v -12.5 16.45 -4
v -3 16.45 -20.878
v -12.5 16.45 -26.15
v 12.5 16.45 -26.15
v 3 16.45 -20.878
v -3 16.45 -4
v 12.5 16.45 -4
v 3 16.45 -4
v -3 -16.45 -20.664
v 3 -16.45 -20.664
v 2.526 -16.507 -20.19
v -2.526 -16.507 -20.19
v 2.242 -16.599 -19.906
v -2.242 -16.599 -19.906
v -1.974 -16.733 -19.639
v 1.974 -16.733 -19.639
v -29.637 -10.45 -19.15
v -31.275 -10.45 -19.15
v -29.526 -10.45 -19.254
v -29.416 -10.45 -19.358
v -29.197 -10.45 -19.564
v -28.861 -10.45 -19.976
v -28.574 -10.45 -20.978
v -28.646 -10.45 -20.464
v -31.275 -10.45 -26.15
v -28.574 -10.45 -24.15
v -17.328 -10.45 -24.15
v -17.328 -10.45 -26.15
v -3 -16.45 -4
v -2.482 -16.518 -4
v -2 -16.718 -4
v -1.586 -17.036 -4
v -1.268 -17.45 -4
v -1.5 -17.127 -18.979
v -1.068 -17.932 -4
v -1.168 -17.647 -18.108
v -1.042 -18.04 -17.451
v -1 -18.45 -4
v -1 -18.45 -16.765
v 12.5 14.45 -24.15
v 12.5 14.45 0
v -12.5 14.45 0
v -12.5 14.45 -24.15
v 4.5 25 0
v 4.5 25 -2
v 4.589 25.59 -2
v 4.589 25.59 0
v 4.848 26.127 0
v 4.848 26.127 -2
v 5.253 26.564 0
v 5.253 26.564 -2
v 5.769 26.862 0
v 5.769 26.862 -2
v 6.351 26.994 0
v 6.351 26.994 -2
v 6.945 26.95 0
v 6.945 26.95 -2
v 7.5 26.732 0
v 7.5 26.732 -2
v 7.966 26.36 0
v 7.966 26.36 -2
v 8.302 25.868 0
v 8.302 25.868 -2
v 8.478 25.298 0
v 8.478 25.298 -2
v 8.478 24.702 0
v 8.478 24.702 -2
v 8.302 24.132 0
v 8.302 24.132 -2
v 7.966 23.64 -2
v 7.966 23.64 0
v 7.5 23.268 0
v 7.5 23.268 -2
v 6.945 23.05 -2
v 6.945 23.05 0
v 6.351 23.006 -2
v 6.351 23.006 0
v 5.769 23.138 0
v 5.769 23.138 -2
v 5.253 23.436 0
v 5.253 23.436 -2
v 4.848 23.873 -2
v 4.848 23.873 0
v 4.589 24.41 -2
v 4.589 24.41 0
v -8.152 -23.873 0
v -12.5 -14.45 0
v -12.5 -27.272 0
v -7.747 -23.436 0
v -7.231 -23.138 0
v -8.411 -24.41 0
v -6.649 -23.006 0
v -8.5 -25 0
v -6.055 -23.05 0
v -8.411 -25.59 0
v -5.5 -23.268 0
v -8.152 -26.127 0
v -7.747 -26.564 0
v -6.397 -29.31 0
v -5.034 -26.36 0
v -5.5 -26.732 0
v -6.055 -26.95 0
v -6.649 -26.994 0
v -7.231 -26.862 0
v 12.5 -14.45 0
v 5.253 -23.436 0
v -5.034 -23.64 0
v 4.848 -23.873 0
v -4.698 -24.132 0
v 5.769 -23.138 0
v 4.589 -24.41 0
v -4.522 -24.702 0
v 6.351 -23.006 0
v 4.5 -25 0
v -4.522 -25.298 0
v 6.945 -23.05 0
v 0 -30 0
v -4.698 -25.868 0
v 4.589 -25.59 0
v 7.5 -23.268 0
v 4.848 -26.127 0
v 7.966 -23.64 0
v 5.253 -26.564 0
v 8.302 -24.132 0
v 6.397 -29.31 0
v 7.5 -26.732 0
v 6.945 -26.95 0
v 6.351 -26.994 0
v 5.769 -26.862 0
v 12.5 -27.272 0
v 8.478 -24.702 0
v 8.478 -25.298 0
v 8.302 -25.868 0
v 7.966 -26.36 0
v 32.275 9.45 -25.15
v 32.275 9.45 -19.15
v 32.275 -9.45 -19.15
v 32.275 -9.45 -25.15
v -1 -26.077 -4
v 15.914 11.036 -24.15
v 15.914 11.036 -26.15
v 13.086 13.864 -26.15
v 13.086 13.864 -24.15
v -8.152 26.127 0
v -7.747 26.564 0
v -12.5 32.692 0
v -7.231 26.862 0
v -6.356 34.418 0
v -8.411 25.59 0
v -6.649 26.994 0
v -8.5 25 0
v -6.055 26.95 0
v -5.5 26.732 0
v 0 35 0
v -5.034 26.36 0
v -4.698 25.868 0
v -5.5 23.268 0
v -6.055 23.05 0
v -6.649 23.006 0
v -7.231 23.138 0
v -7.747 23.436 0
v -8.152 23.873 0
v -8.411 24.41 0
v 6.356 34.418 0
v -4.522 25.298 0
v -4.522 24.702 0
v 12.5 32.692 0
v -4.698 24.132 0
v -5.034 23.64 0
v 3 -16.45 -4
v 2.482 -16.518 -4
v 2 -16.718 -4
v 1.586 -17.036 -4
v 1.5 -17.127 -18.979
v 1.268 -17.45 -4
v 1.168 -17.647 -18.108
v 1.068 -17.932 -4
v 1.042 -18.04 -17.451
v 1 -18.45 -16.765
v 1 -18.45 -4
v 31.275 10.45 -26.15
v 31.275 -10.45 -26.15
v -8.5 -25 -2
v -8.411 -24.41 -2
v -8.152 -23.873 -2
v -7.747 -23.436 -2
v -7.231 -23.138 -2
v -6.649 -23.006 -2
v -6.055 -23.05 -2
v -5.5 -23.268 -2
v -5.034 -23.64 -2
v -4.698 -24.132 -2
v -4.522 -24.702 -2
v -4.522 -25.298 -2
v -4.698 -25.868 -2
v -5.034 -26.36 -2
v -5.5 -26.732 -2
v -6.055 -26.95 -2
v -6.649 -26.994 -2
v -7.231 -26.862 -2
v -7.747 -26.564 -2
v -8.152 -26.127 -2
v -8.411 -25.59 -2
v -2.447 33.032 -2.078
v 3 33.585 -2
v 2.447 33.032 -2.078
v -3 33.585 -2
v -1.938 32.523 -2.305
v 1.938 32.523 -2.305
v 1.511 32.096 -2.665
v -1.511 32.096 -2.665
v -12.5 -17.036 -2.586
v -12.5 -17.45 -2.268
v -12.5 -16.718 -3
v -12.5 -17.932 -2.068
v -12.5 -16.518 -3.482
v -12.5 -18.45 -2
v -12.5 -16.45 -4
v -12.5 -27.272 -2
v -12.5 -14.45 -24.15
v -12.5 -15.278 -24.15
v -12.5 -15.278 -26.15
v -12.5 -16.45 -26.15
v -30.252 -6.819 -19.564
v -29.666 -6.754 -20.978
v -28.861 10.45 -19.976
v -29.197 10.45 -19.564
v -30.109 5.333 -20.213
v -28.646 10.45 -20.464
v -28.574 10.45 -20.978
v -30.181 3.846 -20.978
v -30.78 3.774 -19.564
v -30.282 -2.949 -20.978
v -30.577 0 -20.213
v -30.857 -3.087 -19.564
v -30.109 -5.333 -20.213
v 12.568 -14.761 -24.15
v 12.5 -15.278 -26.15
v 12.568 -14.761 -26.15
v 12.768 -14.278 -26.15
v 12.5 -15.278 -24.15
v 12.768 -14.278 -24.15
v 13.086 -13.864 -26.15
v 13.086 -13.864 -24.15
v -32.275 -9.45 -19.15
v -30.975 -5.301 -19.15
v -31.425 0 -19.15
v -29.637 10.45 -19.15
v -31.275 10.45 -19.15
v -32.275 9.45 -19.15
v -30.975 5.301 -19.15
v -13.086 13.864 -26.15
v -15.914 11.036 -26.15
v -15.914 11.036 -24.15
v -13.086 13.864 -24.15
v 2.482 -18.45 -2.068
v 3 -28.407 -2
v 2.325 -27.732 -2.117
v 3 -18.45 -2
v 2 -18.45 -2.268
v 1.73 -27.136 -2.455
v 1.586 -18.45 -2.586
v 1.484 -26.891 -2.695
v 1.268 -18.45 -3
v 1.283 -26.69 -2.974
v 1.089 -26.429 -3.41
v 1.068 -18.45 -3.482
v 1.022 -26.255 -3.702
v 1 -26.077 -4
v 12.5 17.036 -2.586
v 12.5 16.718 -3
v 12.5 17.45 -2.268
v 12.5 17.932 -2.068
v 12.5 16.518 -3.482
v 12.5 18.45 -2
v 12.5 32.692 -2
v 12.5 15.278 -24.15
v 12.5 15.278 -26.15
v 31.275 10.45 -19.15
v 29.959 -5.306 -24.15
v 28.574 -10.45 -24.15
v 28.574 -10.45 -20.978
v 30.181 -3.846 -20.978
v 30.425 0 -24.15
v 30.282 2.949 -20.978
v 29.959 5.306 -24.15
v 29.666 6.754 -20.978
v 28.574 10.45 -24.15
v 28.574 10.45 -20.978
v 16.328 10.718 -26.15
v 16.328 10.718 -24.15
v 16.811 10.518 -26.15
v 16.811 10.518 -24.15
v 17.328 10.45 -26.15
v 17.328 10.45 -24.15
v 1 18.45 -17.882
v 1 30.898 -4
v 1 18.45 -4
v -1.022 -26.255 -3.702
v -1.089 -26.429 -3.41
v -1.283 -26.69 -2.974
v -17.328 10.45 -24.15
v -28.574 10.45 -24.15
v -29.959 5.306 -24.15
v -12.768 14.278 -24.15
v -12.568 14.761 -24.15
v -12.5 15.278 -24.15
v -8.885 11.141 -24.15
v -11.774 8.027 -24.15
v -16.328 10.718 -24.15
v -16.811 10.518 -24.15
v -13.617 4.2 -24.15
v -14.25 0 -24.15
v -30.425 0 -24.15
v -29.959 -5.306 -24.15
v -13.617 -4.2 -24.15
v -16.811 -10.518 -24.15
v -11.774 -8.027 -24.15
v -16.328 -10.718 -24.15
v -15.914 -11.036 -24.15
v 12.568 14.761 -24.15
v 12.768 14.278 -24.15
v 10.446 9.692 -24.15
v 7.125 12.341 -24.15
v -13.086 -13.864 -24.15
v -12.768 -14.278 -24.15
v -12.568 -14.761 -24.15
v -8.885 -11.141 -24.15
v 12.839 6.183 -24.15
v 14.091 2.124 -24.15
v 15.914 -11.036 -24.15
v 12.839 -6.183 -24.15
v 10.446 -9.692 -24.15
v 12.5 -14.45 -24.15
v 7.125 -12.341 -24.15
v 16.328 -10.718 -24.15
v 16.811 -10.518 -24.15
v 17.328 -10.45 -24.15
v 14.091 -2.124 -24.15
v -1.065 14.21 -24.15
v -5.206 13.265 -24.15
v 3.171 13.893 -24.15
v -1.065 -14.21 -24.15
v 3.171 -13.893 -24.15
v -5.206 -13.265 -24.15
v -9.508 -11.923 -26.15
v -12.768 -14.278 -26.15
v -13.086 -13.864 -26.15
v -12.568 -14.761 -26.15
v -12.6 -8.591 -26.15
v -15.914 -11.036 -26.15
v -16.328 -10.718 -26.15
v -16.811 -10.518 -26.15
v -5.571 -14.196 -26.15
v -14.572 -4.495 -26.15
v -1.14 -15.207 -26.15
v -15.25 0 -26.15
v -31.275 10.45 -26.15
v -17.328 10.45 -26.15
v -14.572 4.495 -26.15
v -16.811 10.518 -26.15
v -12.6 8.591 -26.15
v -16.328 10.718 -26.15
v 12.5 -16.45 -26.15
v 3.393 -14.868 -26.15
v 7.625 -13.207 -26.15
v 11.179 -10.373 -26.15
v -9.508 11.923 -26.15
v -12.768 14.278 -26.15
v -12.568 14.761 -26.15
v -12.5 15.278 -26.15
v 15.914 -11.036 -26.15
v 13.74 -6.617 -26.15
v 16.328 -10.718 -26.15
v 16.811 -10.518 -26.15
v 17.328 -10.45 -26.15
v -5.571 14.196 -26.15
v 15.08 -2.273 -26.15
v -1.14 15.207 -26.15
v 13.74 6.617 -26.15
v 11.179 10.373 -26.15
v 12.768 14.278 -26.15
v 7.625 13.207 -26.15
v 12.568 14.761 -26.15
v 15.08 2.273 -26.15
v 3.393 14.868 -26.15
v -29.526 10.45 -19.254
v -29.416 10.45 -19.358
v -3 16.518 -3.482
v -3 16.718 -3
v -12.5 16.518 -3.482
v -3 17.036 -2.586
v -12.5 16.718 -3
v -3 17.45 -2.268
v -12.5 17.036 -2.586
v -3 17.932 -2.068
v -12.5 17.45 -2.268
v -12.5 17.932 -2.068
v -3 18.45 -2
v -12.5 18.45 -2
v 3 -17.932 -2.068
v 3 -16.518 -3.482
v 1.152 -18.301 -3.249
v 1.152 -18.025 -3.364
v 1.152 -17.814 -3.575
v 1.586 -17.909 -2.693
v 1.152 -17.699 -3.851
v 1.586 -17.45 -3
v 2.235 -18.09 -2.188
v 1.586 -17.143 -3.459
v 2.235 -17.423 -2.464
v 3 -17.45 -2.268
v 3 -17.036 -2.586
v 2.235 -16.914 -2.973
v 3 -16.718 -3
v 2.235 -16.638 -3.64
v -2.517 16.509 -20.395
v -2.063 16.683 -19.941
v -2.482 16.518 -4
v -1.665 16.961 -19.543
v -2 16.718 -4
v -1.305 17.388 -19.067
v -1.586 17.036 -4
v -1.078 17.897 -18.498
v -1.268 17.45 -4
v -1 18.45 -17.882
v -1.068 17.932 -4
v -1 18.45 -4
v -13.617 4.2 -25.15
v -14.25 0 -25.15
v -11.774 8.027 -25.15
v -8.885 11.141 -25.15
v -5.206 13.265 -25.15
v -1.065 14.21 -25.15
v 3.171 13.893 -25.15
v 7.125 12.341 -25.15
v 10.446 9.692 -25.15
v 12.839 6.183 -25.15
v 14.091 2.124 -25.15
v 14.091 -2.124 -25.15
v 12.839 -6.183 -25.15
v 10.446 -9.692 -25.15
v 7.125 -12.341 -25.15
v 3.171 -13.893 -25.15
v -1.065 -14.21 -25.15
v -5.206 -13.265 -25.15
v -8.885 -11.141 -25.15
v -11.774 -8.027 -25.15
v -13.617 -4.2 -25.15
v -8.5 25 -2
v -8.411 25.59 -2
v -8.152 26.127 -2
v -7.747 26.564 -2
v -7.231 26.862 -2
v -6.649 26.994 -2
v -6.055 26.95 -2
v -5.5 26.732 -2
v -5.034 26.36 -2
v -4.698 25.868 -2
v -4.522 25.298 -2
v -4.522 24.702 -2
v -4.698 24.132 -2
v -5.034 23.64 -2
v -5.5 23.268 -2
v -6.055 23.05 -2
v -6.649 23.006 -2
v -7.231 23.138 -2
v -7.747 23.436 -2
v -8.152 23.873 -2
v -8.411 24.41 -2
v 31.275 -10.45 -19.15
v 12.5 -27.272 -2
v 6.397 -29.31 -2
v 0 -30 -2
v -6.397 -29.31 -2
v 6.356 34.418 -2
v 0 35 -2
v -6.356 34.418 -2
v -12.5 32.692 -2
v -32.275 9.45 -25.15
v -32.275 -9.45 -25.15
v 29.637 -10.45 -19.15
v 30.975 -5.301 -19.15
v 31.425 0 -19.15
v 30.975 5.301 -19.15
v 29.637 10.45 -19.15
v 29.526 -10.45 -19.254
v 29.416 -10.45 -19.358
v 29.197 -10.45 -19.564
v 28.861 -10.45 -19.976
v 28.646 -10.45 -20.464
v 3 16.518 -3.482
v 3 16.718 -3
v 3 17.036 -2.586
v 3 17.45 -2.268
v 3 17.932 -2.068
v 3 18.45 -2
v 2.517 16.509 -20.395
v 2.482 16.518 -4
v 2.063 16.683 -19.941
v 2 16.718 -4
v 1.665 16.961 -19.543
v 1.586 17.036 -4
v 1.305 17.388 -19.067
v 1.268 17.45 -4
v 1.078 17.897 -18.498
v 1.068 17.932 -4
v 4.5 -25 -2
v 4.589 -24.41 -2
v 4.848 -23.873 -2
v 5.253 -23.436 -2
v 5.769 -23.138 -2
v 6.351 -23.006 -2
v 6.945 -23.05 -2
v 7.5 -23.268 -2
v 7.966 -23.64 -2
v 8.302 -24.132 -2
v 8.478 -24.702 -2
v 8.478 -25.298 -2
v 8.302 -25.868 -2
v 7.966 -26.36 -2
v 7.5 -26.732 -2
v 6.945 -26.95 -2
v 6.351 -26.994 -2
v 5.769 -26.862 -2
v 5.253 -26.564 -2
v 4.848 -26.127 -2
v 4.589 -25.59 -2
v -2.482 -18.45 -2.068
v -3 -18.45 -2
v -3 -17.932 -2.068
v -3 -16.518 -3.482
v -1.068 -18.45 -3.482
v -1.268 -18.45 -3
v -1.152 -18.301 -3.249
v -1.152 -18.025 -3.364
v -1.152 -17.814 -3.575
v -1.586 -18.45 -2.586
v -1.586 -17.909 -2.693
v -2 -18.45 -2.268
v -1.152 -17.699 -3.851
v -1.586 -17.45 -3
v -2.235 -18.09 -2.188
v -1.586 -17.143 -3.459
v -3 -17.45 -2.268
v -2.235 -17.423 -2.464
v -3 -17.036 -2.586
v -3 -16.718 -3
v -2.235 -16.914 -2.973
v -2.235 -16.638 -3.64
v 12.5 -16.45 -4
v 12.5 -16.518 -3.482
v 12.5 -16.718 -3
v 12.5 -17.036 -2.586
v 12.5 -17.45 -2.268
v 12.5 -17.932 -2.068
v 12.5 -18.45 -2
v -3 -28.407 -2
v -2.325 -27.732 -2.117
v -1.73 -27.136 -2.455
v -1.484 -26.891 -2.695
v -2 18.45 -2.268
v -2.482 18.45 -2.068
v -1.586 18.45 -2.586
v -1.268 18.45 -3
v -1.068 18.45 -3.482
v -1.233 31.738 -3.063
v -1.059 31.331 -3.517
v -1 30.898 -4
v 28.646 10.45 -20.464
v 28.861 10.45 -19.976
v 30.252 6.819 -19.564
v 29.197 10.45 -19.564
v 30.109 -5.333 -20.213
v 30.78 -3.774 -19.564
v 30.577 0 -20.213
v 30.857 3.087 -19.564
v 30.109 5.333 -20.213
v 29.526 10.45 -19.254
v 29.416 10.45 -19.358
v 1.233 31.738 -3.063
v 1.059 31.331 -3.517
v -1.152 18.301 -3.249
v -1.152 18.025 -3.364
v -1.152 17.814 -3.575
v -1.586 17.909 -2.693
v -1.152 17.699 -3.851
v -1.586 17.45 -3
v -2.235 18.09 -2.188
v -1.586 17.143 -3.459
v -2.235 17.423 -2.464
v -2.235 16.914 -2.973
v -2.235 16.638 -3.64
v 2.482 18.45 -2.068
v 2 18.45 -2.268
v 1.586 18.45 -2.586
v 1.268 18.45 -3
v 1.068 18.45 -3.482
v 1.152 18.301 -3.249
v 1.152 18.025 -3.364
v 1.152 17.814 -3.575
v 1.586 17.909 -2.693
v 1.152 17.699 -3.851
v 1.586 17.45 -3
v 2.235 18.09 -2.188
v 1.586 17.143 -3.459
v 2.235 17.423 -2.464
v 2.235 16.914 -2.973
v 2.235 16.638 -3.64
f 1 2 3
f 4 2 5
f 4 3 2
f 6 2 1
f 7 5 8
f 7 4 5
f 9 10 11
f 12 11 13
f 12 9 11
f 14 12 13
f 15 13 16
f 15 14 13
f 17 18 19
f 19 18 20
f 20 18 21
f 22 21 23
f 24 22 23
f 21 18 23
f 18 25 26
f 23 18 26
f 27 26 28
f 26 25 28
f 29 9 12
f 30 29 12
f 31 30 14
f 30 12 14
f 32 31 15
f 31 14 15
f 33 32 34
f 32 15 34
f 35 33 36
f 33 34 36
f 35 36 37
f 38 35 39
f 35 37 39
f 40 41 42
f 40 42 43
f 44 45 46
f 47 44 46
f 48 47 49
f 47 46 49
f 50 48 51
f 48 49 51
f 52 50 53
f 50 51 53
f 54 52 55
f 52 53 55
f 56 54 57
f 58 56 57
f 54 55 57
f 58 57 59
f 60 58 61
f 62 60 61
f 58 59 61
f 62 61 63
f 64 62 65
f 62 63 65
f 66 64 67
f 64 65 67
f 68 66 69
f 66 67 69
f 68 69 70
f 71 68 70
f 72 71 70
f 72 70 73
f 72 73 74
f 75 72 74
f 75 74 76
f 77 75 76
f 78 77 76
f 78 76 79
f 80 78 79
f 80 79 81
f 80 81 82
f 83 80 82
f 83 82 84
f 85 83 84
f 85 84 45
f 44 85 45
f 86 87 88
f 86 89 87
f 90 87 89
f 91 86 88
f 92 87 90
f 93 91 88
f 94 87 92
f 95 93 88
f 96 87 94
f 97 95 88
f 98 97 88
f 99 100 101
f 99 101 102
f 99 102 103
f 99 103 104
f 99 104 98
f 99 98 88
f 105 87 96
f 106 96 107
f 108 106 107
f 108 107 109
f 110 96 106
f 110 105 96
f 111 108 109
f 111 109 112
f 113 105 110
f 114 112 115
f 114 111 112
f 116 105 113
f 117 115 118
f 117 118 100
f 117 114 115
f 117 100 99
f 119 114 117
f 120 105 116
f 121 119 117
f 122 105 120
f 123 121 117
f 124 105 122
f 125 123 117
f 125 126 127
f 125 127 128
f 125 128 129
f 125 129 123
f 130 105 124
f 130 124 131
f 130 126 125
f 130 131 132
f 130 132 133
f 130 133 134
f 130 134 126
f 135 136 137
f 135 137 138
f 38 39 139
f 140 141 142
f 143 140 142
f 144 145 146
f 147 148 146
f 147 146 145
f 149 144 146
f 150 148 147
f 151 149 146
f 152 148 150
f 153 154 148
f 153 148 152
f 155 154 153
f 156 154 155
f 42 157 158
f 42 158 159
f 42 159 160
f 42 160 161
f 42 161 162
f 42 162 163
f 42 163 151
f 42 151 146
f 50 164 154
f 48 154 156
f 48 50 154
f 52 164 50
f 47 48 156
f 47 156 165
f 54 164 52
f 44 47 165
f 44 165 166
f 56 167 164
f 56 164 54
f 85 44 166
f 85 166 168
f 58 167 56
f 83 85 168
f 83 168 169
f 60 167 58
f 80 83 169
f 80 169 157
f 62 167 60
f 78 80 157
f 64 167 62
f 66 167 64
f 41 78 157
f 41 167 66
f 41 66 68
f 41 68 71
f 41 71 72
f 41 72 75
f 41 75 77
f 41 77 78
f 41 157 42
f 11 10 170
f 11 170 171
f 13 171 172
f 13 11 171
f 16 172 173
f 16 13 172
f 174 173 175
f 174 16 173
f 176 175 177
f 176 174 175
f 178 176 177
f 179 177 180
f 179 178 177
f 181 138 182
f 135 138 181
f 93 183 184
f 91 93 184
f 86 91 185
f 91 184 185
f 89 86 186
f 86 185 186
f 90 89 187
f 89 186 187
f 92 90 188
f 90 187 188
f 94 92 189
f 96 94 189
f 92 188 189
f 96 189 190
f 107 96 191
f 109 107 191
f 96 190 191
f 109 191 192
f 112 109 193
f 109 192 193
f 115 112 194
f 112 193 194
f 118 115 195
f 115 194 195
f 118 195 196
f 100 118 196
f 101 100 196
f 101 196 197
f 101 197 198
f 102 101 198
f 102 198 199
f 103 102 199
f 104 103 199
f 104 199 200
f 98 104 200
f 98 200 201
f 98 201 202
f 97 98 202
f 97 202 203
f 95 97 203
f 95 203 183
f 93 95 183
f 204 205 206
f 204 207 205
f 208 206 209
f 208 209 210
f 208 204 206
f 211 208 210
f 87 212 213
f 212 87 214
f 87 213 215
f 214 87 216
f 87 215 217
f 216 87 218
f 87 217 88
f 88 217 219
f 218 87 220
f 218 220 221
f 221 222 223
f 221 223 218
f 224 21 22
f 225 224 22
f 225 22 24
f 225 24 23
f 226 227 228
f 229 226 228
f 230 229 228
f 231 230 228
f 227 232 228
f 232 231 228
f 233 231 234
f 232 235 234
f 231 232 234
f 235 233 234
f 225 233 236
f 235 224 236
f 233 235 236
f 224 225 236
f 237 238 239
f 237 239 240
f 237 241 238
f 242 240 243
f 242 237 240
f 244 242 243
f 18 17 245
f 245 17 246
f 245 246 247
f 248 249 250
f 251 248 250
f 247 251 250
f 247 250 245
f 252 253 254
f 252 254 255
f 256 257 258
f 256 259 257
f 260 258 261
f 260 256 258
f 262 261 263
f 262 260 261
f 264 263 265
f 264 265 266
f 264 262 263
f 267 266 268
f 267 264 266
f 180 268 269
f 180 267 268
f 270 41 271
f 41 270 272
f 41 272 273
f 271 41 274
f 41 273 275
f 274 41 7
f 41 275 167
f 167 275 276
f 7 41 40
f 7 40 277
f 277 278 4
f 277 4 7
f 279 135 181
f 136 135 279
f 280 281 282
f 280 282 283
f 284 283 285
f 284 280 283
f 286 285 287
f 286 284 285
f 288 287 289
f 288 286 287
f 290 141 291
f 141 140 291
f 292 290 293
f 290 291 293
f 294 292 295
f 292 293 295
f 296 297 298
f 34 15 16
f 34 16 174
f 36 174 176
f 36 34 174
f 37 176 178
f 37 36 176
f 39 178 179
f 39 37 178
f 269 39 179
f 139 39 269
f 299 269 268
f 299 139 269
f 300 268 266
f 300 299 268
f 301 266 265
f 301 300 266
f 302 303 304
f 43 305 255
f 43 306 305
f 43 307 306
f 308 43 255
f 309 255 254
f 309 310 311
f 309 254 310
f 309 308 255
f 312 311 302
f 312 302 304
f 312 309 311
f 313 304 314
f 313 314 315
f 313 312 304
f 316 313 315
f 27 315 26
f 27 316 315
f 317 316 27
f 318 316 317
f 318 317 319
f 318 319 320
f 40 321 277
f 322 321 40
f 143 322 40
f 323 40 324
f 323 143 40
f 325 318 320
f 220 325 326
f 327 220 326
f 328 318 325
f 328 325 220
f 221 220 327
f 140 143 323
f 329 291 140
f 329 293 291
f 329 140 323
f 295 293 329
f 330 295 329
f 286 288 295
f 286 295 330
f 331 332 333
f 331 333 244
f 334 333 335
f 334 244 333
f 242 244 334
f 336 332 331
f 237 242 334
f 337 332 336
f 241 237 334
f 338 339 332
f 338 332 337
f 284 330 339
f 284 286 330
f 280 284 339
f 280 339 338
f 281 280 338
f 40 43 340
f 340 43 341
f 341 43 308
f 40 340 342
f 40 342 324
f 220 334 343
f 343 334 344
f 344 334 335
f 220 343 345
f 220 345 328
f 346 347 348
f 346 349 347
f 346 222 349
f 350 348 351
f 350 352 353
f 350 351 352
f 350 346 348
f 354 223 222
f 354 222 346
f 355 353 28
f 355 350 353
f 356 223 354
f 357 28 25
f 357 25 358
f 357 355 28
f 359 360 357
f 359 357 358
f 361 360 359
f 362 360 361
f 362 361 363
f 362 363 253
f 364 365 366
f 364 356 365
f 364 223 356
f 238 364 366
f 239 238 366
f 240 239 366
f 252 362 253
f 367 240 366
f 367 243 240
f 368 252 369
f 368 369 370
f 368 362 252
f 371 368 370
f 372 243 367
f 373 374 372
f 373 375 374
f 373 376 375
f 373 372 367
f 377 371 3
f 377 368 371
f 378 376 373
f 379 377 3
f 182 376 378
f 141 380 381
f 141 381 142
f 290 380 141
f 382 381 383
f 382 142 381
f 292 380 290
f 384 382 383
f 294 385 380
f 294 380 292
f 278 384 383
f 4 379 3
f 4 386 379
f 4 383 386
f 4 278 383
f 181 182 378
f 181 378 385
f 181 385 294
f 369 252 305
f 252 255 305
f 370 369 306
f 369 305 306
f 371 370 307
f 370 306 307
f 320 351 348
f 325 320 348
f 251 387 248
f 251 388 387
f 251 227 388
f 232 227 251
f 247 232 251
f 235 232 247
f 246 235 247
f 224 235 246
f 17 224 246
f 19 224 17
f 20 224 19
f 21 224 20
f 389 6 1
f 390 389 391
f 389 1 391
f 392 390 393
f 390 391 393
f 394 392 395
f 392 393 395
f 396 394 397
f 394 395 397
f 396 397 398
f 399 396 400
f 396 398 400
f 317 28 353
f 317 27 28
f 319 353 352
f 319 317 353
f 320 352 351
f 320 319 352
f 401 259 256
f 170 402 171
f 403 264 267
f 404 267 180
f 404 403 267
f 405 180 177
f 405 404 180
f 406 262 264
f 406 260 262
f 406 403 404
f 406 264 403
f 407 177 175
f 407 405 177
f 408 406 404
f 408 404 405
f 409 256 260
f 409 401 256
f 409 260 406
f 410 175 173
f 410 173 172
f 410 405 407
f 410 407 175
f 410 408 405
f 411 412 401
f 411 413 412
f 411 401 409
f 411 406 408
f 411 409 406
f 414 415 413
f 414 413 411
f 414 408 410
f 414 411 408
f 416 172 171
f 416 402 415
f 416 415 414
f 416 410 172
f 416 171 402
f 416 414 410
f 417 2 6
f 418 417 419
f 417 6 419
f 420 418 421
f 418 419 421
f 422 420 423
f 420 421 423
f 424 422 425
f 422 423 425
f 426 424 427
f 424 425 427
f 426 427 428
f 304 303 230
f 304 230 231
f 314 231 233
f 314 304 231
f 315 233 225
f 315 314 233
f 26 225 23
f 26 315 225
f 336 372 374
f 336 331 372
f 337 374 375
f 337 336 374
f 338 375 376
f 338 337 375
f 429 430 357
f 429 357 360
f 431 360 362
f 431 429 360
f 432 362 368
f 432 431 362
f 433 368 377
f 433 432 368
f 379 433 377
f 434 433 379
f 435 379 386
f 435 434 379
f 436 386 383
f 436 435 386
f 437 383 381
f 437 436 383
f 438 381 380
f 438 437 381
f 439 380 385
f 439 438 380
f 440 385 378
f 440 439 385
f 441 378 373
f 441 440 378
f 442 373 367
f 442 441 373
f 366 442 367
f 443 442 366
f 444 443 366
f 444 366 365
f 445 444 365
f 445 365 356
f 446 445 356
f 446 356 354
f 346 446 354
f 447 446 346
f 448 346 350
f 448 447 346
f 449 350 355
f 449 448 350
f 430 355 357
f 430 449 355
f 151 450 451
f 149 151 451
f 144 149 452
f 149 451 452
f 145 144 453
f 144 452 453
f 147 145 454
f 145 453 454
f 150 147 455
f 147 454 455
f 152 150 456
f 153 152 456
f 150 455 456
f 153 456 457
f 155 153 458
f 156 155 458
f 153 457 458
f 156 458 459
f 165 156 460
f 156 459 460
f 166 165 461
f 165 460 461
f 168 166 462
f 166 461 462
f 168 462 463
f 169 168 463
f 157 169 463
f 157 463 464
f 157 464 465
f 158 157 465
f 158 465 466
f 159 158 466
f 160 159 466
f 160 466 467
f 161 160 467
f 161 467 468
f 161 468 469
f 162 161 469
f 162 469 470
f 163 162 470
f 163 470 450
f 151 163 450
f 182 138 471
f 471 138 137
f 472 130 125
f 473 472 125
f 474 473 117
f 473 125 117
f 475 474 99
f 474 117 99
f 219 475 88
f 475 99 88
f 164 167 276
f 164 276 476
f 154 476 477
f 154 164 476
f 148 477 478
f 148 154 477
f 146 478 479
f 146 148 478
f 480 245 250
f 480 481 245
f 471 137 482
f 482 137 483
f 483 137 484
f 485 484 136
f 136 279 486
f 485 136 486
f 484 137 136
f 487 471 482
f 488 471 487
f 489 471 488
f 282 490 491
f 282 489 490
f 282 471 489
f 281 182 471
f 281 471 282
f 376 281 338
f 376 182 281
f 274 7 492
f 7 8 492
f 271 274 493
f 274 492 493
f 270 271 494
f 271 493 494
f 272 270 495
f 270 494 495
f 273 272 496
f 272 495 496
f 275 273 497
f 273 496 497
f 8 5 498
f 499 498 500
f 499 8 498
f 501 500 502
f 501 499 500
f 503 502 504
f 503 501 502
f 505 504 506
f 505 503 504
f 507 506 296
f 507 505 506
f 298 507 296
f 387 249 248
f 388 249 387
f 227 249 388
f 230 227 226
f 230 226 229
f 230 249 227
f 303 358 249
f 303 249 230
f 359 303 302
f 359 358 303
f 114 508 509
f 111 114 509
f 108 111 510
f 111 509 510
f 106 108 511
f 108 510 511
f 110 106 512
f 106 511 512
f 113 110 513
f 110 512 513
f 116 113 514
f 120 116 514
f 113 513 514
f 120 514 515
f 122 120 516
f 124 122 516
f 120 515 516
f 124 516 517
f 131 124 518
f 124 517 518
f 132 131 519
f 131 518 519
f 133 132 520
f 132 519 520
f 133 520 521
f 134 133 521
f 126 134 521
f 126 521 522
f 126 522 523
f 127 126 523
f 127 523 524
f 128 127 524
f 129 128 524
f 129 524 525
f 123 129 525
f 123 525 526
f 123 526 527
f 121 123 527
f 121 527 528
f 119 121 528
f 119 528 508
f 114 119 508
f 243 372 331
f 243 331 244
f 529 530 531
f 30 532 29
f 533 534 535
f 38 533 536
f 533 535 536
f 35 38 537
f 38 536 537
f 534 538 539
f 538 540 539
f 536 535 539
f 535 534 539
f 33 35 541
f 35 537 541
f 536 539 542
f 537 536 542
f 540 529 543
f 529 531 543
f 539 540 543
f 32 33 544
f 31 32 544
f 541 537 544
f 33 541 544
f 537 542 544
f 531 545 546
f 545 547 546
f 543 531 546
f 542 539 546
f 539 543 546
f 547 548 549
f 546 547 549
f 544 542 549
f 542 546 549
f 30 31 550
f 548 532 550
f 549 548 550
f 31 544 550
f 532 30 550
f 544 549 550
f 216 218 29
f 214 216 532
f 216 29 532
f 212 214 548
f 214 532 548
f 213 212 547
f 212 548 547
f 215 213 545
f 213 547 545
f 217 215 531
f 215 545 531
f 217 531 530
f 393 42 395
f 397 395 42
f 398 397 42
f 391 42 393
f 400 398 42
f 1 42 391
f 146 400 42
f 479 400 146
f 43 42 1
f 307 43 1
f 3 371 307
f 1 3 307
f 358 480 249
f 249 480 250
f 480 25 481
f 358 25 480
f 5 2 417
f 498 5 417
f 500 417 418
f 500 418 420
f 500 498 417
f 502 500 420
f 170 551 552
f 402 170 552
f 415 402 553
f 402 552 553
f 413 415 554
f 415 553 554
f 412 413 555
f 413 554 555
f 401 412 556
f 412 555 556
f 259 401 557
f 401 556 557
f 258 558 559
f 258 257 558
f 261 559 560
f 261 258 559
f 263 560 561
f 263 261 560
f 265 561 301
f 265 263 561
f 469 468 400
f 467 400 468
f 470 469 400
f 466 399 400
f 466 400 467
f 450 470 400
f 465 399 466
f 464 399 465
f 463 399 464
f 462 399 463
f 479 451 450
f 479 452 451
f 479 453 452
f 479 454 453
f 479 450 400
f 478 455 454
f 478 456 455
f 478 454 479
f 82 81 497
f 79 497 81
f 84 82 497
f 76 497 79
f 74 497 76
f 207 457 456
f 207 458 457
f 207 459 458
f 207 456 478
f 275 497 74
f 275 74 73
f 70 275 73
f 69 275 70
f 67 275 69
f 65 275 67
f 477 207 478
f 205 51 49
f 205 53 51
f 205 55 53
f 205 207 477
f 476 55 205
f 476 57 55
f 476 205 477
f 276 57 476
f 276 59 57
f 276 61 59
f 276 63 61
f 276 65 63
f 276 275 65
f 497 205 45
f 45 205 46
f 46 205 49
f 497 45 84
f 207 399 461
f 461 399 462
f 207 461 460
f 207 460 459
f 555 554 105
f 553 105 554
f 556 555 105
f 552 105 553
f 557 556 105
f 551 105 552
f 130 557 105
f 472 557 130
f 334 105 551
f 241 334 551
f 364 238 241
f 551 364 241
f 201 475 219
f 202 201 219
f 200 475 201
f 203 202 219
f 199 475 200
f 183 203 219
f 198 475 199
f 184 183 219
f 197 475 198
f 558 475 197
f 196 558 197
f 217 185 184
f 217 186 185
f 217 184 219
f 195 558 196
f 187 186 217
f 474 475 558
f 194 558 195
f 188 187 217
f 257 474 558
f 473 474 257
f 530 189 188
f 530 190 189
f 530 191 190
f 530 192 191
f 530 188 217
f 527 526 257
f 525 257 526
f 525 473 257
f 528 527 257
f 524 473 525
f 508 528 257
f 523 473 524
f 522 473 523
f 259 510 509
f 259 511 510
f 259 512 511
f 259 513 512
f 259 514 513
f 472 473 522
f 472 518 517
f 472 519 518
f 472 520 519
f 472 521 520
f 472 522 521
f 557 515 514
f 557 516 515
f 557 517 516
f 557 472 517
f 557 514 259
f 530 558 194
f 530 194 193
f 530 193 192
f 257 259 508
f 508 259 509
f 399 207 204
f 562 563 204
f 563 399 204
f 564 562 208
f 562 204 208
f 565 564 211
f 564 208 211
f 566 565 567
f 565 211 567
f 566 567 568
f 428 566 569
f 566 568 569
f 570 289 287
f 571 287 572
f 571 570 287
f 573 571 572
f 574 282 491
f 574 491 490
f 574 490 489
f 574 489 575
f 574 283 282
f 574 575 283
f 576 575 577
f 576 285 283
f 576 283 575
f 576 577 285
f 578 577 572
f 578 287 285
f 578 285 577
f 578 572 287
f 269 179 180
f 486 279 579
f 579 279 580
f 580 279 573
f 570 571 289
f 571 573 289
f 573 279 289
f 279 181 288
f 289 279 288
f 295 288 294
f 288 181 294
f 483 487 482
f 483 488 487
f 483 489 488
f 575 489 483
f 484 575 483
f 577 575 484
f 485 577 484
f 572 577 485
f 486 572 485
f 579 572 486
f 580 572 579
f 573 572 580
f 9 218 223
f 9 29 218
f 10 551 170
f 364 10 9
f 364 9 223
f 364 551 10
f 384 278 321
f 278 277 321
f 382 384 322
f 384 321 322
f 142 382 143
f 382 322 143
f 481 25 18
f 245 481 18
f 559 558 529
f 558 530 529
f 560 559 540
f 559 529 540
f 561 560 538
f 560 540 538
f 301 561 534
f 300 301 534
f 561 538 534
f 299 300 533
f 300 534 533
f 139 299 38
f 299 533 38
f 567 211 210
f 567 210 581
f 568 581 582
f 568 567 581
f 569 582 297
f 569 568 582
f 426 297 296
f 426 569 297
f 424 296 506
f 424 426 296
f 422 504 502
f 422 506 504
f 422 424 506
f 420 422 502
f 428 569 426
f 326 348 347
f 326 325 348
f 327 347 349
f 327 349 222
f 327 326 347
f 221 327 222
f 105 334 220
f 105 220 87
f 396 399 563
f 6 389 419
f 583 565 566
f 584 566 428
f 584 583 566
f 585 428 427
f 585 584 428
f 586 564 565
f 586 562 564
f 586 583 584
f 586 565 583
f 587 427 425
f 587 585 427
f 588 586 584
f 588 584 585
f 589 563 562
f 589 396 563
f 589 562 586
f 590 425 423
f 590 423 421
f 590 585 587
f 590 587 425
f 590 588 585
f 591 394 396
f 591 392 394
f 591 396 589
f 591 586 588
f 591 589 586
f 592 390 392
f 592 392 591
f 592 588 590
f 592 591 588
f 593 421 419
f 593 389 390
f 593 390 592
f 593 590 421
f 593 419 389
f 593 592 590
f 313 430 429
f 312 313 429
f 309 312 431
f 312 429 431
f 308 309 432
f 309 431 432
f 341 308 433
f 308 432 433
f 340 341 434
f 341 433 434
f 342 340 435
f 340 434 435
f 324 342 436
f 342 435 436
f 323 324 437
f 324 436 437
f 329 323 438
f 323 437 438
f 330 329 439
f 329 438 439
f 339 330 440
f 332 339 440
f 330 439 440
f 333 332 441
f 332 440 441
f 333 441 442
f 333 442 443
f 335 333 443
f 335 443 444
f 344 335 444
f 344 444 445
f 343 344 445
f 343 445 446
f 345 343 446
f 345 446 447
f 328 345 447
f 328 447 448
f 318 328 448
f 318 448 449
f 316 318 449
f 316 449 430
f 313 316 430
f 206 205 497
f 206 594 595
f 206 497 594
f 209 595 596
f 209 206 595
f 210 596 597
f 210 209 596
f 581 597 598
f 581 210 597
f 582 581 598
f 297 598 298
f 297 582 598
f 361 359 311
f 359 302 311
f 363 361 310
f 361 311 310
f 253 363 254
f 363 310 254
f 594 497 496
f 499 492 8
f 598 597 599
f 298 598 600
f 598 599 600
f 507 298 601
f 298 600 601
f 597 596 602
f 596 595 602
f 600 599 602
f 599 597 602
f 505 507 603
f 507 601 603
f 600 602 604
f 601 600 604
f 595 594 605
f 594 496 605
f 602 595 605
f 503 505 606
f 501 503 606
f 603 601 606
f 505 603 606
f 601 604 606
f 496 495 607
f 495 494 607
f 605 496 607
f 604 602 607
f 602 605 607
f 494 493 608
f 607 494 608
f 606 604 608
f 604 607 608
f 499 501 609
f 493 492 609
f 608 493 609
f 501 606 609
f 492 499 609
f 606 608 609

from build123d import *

# Parameters (mm, degrees)
BOSS_EXTRUDE1_DEPTH     = 12.5
SKETCH2_R               = 45
SKETCH2_R_2             = 35
CUT_EXTRUDE_THIN1_DEPTH = 10
CUT_EXTRUDE1_DEPTH      = 10
BOSS_EXTRUDE2_DEPTH     = 32.275
SKETCH5_R               = 14.25
CUT_EXTRUDE2_DEPTH      = 40
CHAMFER1_SIZE           = 5
CHAMFER2_SIZE           = 1
BOSS_EXTRUDE3_DEPTH     = 5
CHAMFER3_SIZE           = 5
FILLET1_R               = 3
RIB2_REACH              = 56.318
SKETCH7_WALL_W          = 134.965083932
SKETCH7_WALL_H          = 2
RIB3_REACH              = 56.318
SKETCH8_WALL_W          = 131.736112932
SKETCH8_WALL_H          = 2
CUT_EXTRUDE3_DEPTH      = 55.318487934
CHAMFER4_SIZE           = 1
SKETCH10_R              = 2
CUT_EXTRUDE4_DEPTH      = 5
CHAMFER5_SIZE           = 1
FILLET2_R               = 2


with BuildPart() as part:
    # Sketch1 → Boss-Extrude1 (new, symmetric)
    with BuildSketch(Plane(origin=(0, 0, 0), x_dir=(0, 0, -1), z_dir=(1, 0, 0))):
        Polygon((0, 35), (0, 14.45), (24.15, 14.45), (24.15, -14.45), (0, -14.45), (0, -35), (2, -35), (2, -16.45), (26.15, -16.45), (26.15, 16.45), (2, 16.45), (2, 35), align=None)
    extrude(amount=BOSS_EXTRUDE1_DEPTH, both=True)

    # Sketch2 → Cut-Extrude-Thin1 (cut)
    with BuildSketch(Plane.XY):
        Circle(SKETCH2_R)
        Circle(SKETCH2_R_2, mode=Mode.SUBTRACT)
    extrude(amount=-CUT_EXTRUDE_THIN1_DEPTH, mode=Mode.SUBTRACT)

    # Sketch3 → Cut-Extrude1 (cut)
    with BuildSketch(Plane.XY):
        with BuildLine():
            Line((12.5, -32.691742077), (12.5, -27.271780287))
            ThreePointArc((12.5, -27.271780287), (0, -30), (-12.5, -27.271780287))
            Line((-12.5, -27.271780287), (-12.5, -32.691742077))
            ThreePointArc((-12.5, -32.691742077), (0, -35), (12.5, -32.691742077))
        make_face()
    extrude(amount=-CUT_EXTRUDE1_DEPTH, mode=Mode.SUBTRACT)

    # Sketch4 → Boss-Extrude2 (add, symmetric)
    with BuildSketch(Plane(origin=(0, 0, 0), x_dir=(0, 0, -1), z_dir=(1, 0, 0))):
        Polygon((14.075, 16.45), (14.075, 14.45), (24.15, 14.45), (24.15, -14.45), (14.075, -14.45), (14.075, -16.45), (26.15, -16.45), (26.15, 16.45), align=None)
    extrude(amount=BOSS_EXTRUDE2_DEPTH, both=True)

    # Sketch5 → Cut-Extrude2 (cut)
    with BuildSketch(Plane(origin=(0, 0, -26.15), x_dir=(-1, 0, 0), z_dir=(0, 0, -1))):
        Circle(SKETCH5_R)
    extrude(amount=-CUT_EXTRUDE2_DEPTH, mode=Mode.SUBTRACT)

    # Chamfer1
    chamfer1_edges = [part.edges().sort_by_distance(p)[0] for p in [
        (12.5, -15.45, -14.075),
        (-12.5, -15.45, -14.075),
        (12.5, 15.45, -14.075),
        (-12.5, 15.45, -14.075),
    ]]
    chamfer(chamfer1_edges, length=CHAMFER1_SIZE)

    # Chamfer2
    chamfer2_edges = [part.edges().sort_by_distance(p)[0] for p in [
        (14.25, 0, -26.15),
    ]]
    chamfer(chamfer2_edges, length=CHAMFER2_SIZE)

    # Sketch6 → Boss-Extrude3 (add)
    with BuildSketch(Plane.XY.offset(-24.15)):
        with BuildLine():
            Line((-32.275, -14.45), (-32.275, 14.45))
            Line((-32.275, 14.45), (-26.774579829, 14.45))
            ThreePointArc((-26.774579829, 14.45), (-30.425, 0), (-26.774579829, -14.45))
            Line((-26.774579829, -14.45), (-32.275, -14.45))
        make_face()
        with BuildLine():
            Line((32.275, -14.45), (26.774579829, -14.45))
            ThreePointArc((26.774579829, -14.45), (30.425, 0), (26.774579829, 14.45))
            Line((26.774579829, 14.45), (32.275, 14.45))
            Line((32.275, 14.45), (32.275, -14.45))
        make_face()
    extrude(amount=BOSS_EXTRUDE3_DEPTH)

    # Chamfer3
    chamfer3_edges = [part.edges().sort_by_distance(p)[0] for p in [
        (-32.275, 16.45, -20.1125),
        (-32.275, -16.45, -20.1125),
        (32.275, -16.45, -20.1125),
        (32.275, 16.45, -20.1125),
    ]]
    chamfer(chamfer3_edges, length=CHAMFER3_SIZE)

    # Fillet1
    fillet1_edges = [part.edges().sort_by_distance(p)[0] for p in [
        (-28.024789914, -14.45, -19.15),
        (28.024789914, -14.45, -19.15),
        (28.024789914, 14.45, -19.15),
        (-28.024789914, 14.45, -19.15),
    ]]
    fillet(fillet1_edges, radius=FILLET1_R)

    # Sketch7 wall → Rib2 (add, up to next)
    with BuildSketch(Plane(origin=(0, 24.570871039, -11.05625), x_dir=(0, -0.667612213603, -0.744509188827), z_dir=(0, 0.744509188827, -0.667612213603)), mode=Mode.PRIVATE) as rib2_sk1:
        Rectangle(SKETCH7_WALL_W, SKETCH7_WALL_H)
    rib2_tool1 = extrude(rib2_sk1.sketch, amount=-RIB2_REACH, mode=Mode.PRIVATE) - part.part
    add(rib2_tool1.solids().sort_by_distance((0, 24.570871039, -11.05625))[0])

    # Sketch8 wall → Rib3 (add, up to next)
    with BuildSketch(Plane(origin=(0, -21.860890144, -11.05625), x_dir=(0, -0.512901558692, 0.858447430593), z_dir=(0, -0.858447430593, -0.512901558692)), mode=Mode.PRIVATE) as rib3_sk1:
        Rectangle(SKETCH8_WALL_W, SKETCH8_WALL_H)
    rib3_tool1 = extrude(rib3_sk1.sketch, amount=-RIB3_REACH, mode=Mode.PRIVATE) - part.part
    add(rib3_tool1.solids().sort_by_distance((0, -21.860890144, -11.05625))[0])

    # Sketch9 → Cut-Extrude3 (cut, through all)
    with BuildSketch(Plane(origin=(0, 0, -26.15), x_dir=(-1, 0, 0), z_dir=(0, 0, -1))):
        Polygon((12.5, 14.45), (12.5, 16.45), (27.275, 16.45), (32.275, 11.45), (32.275, 10.45), (16.5, 10.45), align=None)
        Polygon((-27.275, 16.45), (-32.275, 11.45), (-32.275, 10.45), (-16.5, 10.45), (-12.5, 14.45), (-12.5, 16.45), align=None)
        Polygon((27.275, -16.45), (32.275, -11.45), (32.275, -10.45), (16.5, -10.45), (12.5, -14.45), (12.5, -16.45), align=None)
        Polygon((-12.5, -14.45), (-12.5, -16.45), (-27.275, -16.45), (-32.275, -11.45), (-32.275, -10.45), (-16.5, -10.45), align=None)
    extrude(amount=-CUT_EXTRUDE3_DEPTH, mode=Mode.SUBTRACT)

    # Chamfer4
    chamfer4_edges = [part.edges().sort_by_distance(p)[0] for p in [
        (30.425, 0, -19.15),
        (-30.425, 0, -19.15),
    ]]
    chamfer(chamfer4_edges, length=CHAMFER4_SIZE)

    # Sketch10 → Cut-Extrude4 (cut)
    with BuildSketch(Plane(origin=(0, 0, -2), x_dir=(-1, 0, 0), z_dir=(0, 0, -1))):
        with Locations((6.5, 25)):
            Circle(SKETCH10_R)
        with Locations((-6.5, 25)):
            Circle(SKETCH10_R)
        with Locations((-6.5, -25)):
            Circle(SKETCH10_R)
        with Locations((6.5, -25)):
            Circle(SKETCH10_R)
    extrude(amount=-CUT_EXTRUDE4_DEPTH, mode=Mode.SUBTRACT)

    # Chamfer5
    chamfer5_edges = [part.edges().sort_by_distance(p)[0] for p in [
        (-32.275, 10.45, -22.65),
        (32.275, 10.45, -22.65),
        (-32.275, 0, -26.15),
        (-32.275, -10.45, -22.65),
        (32.275, 0, -26.15),
        (32.275, -10.45, -22.65),
    ]]
    chamfer(chamfer5_edges, length=CHAMFER5_SIZE)

    # Fillet2
    fillet2_edges = [part.edges().sort_by_distance(p)[0] for p in [
        (-30.425, 0, -20.15),
        (30.425, 0, -20.15),
        (12.5, 14.45, -25.15),
        (-12.5, 14.45, -25.15),
        (-12.5, -14.45, -25.15),
        (12.5, -14.45, -25.15),
        (16.5, -10.45, -25.15),
        (16.5, 10.45, -25.15),
        (-16.5, 10.45, -25.15),
        (-16.5, -10.45, -25.15),
        (6.75, -16.45, -2),
        (-6.75, -16.45, -2),
        (-6.75, 16.45, -2),
        (6.75, 16.45, -2),
        (0, -27.271780287, -2),
        (0, 32.691742077, -2),
        (0, 16.45, -20.112500001),
        (0, -16.45, -20.112500001),
        (1, -21.860890144, -2),
        (1, -16.45, -11.05625),
        (-1, -21.860890144, -2),
        (-1, -16.45, -11.05625),
        (-1, 24.570871039, -2),
        (-1, 16.45, -11.05625),
        (1, 24.570871039, -2),
        (1, 16.45, -11.05625),
    ]]
    fillet(fillet2_edges, radius=FILLET2_R)


solid = part.part
